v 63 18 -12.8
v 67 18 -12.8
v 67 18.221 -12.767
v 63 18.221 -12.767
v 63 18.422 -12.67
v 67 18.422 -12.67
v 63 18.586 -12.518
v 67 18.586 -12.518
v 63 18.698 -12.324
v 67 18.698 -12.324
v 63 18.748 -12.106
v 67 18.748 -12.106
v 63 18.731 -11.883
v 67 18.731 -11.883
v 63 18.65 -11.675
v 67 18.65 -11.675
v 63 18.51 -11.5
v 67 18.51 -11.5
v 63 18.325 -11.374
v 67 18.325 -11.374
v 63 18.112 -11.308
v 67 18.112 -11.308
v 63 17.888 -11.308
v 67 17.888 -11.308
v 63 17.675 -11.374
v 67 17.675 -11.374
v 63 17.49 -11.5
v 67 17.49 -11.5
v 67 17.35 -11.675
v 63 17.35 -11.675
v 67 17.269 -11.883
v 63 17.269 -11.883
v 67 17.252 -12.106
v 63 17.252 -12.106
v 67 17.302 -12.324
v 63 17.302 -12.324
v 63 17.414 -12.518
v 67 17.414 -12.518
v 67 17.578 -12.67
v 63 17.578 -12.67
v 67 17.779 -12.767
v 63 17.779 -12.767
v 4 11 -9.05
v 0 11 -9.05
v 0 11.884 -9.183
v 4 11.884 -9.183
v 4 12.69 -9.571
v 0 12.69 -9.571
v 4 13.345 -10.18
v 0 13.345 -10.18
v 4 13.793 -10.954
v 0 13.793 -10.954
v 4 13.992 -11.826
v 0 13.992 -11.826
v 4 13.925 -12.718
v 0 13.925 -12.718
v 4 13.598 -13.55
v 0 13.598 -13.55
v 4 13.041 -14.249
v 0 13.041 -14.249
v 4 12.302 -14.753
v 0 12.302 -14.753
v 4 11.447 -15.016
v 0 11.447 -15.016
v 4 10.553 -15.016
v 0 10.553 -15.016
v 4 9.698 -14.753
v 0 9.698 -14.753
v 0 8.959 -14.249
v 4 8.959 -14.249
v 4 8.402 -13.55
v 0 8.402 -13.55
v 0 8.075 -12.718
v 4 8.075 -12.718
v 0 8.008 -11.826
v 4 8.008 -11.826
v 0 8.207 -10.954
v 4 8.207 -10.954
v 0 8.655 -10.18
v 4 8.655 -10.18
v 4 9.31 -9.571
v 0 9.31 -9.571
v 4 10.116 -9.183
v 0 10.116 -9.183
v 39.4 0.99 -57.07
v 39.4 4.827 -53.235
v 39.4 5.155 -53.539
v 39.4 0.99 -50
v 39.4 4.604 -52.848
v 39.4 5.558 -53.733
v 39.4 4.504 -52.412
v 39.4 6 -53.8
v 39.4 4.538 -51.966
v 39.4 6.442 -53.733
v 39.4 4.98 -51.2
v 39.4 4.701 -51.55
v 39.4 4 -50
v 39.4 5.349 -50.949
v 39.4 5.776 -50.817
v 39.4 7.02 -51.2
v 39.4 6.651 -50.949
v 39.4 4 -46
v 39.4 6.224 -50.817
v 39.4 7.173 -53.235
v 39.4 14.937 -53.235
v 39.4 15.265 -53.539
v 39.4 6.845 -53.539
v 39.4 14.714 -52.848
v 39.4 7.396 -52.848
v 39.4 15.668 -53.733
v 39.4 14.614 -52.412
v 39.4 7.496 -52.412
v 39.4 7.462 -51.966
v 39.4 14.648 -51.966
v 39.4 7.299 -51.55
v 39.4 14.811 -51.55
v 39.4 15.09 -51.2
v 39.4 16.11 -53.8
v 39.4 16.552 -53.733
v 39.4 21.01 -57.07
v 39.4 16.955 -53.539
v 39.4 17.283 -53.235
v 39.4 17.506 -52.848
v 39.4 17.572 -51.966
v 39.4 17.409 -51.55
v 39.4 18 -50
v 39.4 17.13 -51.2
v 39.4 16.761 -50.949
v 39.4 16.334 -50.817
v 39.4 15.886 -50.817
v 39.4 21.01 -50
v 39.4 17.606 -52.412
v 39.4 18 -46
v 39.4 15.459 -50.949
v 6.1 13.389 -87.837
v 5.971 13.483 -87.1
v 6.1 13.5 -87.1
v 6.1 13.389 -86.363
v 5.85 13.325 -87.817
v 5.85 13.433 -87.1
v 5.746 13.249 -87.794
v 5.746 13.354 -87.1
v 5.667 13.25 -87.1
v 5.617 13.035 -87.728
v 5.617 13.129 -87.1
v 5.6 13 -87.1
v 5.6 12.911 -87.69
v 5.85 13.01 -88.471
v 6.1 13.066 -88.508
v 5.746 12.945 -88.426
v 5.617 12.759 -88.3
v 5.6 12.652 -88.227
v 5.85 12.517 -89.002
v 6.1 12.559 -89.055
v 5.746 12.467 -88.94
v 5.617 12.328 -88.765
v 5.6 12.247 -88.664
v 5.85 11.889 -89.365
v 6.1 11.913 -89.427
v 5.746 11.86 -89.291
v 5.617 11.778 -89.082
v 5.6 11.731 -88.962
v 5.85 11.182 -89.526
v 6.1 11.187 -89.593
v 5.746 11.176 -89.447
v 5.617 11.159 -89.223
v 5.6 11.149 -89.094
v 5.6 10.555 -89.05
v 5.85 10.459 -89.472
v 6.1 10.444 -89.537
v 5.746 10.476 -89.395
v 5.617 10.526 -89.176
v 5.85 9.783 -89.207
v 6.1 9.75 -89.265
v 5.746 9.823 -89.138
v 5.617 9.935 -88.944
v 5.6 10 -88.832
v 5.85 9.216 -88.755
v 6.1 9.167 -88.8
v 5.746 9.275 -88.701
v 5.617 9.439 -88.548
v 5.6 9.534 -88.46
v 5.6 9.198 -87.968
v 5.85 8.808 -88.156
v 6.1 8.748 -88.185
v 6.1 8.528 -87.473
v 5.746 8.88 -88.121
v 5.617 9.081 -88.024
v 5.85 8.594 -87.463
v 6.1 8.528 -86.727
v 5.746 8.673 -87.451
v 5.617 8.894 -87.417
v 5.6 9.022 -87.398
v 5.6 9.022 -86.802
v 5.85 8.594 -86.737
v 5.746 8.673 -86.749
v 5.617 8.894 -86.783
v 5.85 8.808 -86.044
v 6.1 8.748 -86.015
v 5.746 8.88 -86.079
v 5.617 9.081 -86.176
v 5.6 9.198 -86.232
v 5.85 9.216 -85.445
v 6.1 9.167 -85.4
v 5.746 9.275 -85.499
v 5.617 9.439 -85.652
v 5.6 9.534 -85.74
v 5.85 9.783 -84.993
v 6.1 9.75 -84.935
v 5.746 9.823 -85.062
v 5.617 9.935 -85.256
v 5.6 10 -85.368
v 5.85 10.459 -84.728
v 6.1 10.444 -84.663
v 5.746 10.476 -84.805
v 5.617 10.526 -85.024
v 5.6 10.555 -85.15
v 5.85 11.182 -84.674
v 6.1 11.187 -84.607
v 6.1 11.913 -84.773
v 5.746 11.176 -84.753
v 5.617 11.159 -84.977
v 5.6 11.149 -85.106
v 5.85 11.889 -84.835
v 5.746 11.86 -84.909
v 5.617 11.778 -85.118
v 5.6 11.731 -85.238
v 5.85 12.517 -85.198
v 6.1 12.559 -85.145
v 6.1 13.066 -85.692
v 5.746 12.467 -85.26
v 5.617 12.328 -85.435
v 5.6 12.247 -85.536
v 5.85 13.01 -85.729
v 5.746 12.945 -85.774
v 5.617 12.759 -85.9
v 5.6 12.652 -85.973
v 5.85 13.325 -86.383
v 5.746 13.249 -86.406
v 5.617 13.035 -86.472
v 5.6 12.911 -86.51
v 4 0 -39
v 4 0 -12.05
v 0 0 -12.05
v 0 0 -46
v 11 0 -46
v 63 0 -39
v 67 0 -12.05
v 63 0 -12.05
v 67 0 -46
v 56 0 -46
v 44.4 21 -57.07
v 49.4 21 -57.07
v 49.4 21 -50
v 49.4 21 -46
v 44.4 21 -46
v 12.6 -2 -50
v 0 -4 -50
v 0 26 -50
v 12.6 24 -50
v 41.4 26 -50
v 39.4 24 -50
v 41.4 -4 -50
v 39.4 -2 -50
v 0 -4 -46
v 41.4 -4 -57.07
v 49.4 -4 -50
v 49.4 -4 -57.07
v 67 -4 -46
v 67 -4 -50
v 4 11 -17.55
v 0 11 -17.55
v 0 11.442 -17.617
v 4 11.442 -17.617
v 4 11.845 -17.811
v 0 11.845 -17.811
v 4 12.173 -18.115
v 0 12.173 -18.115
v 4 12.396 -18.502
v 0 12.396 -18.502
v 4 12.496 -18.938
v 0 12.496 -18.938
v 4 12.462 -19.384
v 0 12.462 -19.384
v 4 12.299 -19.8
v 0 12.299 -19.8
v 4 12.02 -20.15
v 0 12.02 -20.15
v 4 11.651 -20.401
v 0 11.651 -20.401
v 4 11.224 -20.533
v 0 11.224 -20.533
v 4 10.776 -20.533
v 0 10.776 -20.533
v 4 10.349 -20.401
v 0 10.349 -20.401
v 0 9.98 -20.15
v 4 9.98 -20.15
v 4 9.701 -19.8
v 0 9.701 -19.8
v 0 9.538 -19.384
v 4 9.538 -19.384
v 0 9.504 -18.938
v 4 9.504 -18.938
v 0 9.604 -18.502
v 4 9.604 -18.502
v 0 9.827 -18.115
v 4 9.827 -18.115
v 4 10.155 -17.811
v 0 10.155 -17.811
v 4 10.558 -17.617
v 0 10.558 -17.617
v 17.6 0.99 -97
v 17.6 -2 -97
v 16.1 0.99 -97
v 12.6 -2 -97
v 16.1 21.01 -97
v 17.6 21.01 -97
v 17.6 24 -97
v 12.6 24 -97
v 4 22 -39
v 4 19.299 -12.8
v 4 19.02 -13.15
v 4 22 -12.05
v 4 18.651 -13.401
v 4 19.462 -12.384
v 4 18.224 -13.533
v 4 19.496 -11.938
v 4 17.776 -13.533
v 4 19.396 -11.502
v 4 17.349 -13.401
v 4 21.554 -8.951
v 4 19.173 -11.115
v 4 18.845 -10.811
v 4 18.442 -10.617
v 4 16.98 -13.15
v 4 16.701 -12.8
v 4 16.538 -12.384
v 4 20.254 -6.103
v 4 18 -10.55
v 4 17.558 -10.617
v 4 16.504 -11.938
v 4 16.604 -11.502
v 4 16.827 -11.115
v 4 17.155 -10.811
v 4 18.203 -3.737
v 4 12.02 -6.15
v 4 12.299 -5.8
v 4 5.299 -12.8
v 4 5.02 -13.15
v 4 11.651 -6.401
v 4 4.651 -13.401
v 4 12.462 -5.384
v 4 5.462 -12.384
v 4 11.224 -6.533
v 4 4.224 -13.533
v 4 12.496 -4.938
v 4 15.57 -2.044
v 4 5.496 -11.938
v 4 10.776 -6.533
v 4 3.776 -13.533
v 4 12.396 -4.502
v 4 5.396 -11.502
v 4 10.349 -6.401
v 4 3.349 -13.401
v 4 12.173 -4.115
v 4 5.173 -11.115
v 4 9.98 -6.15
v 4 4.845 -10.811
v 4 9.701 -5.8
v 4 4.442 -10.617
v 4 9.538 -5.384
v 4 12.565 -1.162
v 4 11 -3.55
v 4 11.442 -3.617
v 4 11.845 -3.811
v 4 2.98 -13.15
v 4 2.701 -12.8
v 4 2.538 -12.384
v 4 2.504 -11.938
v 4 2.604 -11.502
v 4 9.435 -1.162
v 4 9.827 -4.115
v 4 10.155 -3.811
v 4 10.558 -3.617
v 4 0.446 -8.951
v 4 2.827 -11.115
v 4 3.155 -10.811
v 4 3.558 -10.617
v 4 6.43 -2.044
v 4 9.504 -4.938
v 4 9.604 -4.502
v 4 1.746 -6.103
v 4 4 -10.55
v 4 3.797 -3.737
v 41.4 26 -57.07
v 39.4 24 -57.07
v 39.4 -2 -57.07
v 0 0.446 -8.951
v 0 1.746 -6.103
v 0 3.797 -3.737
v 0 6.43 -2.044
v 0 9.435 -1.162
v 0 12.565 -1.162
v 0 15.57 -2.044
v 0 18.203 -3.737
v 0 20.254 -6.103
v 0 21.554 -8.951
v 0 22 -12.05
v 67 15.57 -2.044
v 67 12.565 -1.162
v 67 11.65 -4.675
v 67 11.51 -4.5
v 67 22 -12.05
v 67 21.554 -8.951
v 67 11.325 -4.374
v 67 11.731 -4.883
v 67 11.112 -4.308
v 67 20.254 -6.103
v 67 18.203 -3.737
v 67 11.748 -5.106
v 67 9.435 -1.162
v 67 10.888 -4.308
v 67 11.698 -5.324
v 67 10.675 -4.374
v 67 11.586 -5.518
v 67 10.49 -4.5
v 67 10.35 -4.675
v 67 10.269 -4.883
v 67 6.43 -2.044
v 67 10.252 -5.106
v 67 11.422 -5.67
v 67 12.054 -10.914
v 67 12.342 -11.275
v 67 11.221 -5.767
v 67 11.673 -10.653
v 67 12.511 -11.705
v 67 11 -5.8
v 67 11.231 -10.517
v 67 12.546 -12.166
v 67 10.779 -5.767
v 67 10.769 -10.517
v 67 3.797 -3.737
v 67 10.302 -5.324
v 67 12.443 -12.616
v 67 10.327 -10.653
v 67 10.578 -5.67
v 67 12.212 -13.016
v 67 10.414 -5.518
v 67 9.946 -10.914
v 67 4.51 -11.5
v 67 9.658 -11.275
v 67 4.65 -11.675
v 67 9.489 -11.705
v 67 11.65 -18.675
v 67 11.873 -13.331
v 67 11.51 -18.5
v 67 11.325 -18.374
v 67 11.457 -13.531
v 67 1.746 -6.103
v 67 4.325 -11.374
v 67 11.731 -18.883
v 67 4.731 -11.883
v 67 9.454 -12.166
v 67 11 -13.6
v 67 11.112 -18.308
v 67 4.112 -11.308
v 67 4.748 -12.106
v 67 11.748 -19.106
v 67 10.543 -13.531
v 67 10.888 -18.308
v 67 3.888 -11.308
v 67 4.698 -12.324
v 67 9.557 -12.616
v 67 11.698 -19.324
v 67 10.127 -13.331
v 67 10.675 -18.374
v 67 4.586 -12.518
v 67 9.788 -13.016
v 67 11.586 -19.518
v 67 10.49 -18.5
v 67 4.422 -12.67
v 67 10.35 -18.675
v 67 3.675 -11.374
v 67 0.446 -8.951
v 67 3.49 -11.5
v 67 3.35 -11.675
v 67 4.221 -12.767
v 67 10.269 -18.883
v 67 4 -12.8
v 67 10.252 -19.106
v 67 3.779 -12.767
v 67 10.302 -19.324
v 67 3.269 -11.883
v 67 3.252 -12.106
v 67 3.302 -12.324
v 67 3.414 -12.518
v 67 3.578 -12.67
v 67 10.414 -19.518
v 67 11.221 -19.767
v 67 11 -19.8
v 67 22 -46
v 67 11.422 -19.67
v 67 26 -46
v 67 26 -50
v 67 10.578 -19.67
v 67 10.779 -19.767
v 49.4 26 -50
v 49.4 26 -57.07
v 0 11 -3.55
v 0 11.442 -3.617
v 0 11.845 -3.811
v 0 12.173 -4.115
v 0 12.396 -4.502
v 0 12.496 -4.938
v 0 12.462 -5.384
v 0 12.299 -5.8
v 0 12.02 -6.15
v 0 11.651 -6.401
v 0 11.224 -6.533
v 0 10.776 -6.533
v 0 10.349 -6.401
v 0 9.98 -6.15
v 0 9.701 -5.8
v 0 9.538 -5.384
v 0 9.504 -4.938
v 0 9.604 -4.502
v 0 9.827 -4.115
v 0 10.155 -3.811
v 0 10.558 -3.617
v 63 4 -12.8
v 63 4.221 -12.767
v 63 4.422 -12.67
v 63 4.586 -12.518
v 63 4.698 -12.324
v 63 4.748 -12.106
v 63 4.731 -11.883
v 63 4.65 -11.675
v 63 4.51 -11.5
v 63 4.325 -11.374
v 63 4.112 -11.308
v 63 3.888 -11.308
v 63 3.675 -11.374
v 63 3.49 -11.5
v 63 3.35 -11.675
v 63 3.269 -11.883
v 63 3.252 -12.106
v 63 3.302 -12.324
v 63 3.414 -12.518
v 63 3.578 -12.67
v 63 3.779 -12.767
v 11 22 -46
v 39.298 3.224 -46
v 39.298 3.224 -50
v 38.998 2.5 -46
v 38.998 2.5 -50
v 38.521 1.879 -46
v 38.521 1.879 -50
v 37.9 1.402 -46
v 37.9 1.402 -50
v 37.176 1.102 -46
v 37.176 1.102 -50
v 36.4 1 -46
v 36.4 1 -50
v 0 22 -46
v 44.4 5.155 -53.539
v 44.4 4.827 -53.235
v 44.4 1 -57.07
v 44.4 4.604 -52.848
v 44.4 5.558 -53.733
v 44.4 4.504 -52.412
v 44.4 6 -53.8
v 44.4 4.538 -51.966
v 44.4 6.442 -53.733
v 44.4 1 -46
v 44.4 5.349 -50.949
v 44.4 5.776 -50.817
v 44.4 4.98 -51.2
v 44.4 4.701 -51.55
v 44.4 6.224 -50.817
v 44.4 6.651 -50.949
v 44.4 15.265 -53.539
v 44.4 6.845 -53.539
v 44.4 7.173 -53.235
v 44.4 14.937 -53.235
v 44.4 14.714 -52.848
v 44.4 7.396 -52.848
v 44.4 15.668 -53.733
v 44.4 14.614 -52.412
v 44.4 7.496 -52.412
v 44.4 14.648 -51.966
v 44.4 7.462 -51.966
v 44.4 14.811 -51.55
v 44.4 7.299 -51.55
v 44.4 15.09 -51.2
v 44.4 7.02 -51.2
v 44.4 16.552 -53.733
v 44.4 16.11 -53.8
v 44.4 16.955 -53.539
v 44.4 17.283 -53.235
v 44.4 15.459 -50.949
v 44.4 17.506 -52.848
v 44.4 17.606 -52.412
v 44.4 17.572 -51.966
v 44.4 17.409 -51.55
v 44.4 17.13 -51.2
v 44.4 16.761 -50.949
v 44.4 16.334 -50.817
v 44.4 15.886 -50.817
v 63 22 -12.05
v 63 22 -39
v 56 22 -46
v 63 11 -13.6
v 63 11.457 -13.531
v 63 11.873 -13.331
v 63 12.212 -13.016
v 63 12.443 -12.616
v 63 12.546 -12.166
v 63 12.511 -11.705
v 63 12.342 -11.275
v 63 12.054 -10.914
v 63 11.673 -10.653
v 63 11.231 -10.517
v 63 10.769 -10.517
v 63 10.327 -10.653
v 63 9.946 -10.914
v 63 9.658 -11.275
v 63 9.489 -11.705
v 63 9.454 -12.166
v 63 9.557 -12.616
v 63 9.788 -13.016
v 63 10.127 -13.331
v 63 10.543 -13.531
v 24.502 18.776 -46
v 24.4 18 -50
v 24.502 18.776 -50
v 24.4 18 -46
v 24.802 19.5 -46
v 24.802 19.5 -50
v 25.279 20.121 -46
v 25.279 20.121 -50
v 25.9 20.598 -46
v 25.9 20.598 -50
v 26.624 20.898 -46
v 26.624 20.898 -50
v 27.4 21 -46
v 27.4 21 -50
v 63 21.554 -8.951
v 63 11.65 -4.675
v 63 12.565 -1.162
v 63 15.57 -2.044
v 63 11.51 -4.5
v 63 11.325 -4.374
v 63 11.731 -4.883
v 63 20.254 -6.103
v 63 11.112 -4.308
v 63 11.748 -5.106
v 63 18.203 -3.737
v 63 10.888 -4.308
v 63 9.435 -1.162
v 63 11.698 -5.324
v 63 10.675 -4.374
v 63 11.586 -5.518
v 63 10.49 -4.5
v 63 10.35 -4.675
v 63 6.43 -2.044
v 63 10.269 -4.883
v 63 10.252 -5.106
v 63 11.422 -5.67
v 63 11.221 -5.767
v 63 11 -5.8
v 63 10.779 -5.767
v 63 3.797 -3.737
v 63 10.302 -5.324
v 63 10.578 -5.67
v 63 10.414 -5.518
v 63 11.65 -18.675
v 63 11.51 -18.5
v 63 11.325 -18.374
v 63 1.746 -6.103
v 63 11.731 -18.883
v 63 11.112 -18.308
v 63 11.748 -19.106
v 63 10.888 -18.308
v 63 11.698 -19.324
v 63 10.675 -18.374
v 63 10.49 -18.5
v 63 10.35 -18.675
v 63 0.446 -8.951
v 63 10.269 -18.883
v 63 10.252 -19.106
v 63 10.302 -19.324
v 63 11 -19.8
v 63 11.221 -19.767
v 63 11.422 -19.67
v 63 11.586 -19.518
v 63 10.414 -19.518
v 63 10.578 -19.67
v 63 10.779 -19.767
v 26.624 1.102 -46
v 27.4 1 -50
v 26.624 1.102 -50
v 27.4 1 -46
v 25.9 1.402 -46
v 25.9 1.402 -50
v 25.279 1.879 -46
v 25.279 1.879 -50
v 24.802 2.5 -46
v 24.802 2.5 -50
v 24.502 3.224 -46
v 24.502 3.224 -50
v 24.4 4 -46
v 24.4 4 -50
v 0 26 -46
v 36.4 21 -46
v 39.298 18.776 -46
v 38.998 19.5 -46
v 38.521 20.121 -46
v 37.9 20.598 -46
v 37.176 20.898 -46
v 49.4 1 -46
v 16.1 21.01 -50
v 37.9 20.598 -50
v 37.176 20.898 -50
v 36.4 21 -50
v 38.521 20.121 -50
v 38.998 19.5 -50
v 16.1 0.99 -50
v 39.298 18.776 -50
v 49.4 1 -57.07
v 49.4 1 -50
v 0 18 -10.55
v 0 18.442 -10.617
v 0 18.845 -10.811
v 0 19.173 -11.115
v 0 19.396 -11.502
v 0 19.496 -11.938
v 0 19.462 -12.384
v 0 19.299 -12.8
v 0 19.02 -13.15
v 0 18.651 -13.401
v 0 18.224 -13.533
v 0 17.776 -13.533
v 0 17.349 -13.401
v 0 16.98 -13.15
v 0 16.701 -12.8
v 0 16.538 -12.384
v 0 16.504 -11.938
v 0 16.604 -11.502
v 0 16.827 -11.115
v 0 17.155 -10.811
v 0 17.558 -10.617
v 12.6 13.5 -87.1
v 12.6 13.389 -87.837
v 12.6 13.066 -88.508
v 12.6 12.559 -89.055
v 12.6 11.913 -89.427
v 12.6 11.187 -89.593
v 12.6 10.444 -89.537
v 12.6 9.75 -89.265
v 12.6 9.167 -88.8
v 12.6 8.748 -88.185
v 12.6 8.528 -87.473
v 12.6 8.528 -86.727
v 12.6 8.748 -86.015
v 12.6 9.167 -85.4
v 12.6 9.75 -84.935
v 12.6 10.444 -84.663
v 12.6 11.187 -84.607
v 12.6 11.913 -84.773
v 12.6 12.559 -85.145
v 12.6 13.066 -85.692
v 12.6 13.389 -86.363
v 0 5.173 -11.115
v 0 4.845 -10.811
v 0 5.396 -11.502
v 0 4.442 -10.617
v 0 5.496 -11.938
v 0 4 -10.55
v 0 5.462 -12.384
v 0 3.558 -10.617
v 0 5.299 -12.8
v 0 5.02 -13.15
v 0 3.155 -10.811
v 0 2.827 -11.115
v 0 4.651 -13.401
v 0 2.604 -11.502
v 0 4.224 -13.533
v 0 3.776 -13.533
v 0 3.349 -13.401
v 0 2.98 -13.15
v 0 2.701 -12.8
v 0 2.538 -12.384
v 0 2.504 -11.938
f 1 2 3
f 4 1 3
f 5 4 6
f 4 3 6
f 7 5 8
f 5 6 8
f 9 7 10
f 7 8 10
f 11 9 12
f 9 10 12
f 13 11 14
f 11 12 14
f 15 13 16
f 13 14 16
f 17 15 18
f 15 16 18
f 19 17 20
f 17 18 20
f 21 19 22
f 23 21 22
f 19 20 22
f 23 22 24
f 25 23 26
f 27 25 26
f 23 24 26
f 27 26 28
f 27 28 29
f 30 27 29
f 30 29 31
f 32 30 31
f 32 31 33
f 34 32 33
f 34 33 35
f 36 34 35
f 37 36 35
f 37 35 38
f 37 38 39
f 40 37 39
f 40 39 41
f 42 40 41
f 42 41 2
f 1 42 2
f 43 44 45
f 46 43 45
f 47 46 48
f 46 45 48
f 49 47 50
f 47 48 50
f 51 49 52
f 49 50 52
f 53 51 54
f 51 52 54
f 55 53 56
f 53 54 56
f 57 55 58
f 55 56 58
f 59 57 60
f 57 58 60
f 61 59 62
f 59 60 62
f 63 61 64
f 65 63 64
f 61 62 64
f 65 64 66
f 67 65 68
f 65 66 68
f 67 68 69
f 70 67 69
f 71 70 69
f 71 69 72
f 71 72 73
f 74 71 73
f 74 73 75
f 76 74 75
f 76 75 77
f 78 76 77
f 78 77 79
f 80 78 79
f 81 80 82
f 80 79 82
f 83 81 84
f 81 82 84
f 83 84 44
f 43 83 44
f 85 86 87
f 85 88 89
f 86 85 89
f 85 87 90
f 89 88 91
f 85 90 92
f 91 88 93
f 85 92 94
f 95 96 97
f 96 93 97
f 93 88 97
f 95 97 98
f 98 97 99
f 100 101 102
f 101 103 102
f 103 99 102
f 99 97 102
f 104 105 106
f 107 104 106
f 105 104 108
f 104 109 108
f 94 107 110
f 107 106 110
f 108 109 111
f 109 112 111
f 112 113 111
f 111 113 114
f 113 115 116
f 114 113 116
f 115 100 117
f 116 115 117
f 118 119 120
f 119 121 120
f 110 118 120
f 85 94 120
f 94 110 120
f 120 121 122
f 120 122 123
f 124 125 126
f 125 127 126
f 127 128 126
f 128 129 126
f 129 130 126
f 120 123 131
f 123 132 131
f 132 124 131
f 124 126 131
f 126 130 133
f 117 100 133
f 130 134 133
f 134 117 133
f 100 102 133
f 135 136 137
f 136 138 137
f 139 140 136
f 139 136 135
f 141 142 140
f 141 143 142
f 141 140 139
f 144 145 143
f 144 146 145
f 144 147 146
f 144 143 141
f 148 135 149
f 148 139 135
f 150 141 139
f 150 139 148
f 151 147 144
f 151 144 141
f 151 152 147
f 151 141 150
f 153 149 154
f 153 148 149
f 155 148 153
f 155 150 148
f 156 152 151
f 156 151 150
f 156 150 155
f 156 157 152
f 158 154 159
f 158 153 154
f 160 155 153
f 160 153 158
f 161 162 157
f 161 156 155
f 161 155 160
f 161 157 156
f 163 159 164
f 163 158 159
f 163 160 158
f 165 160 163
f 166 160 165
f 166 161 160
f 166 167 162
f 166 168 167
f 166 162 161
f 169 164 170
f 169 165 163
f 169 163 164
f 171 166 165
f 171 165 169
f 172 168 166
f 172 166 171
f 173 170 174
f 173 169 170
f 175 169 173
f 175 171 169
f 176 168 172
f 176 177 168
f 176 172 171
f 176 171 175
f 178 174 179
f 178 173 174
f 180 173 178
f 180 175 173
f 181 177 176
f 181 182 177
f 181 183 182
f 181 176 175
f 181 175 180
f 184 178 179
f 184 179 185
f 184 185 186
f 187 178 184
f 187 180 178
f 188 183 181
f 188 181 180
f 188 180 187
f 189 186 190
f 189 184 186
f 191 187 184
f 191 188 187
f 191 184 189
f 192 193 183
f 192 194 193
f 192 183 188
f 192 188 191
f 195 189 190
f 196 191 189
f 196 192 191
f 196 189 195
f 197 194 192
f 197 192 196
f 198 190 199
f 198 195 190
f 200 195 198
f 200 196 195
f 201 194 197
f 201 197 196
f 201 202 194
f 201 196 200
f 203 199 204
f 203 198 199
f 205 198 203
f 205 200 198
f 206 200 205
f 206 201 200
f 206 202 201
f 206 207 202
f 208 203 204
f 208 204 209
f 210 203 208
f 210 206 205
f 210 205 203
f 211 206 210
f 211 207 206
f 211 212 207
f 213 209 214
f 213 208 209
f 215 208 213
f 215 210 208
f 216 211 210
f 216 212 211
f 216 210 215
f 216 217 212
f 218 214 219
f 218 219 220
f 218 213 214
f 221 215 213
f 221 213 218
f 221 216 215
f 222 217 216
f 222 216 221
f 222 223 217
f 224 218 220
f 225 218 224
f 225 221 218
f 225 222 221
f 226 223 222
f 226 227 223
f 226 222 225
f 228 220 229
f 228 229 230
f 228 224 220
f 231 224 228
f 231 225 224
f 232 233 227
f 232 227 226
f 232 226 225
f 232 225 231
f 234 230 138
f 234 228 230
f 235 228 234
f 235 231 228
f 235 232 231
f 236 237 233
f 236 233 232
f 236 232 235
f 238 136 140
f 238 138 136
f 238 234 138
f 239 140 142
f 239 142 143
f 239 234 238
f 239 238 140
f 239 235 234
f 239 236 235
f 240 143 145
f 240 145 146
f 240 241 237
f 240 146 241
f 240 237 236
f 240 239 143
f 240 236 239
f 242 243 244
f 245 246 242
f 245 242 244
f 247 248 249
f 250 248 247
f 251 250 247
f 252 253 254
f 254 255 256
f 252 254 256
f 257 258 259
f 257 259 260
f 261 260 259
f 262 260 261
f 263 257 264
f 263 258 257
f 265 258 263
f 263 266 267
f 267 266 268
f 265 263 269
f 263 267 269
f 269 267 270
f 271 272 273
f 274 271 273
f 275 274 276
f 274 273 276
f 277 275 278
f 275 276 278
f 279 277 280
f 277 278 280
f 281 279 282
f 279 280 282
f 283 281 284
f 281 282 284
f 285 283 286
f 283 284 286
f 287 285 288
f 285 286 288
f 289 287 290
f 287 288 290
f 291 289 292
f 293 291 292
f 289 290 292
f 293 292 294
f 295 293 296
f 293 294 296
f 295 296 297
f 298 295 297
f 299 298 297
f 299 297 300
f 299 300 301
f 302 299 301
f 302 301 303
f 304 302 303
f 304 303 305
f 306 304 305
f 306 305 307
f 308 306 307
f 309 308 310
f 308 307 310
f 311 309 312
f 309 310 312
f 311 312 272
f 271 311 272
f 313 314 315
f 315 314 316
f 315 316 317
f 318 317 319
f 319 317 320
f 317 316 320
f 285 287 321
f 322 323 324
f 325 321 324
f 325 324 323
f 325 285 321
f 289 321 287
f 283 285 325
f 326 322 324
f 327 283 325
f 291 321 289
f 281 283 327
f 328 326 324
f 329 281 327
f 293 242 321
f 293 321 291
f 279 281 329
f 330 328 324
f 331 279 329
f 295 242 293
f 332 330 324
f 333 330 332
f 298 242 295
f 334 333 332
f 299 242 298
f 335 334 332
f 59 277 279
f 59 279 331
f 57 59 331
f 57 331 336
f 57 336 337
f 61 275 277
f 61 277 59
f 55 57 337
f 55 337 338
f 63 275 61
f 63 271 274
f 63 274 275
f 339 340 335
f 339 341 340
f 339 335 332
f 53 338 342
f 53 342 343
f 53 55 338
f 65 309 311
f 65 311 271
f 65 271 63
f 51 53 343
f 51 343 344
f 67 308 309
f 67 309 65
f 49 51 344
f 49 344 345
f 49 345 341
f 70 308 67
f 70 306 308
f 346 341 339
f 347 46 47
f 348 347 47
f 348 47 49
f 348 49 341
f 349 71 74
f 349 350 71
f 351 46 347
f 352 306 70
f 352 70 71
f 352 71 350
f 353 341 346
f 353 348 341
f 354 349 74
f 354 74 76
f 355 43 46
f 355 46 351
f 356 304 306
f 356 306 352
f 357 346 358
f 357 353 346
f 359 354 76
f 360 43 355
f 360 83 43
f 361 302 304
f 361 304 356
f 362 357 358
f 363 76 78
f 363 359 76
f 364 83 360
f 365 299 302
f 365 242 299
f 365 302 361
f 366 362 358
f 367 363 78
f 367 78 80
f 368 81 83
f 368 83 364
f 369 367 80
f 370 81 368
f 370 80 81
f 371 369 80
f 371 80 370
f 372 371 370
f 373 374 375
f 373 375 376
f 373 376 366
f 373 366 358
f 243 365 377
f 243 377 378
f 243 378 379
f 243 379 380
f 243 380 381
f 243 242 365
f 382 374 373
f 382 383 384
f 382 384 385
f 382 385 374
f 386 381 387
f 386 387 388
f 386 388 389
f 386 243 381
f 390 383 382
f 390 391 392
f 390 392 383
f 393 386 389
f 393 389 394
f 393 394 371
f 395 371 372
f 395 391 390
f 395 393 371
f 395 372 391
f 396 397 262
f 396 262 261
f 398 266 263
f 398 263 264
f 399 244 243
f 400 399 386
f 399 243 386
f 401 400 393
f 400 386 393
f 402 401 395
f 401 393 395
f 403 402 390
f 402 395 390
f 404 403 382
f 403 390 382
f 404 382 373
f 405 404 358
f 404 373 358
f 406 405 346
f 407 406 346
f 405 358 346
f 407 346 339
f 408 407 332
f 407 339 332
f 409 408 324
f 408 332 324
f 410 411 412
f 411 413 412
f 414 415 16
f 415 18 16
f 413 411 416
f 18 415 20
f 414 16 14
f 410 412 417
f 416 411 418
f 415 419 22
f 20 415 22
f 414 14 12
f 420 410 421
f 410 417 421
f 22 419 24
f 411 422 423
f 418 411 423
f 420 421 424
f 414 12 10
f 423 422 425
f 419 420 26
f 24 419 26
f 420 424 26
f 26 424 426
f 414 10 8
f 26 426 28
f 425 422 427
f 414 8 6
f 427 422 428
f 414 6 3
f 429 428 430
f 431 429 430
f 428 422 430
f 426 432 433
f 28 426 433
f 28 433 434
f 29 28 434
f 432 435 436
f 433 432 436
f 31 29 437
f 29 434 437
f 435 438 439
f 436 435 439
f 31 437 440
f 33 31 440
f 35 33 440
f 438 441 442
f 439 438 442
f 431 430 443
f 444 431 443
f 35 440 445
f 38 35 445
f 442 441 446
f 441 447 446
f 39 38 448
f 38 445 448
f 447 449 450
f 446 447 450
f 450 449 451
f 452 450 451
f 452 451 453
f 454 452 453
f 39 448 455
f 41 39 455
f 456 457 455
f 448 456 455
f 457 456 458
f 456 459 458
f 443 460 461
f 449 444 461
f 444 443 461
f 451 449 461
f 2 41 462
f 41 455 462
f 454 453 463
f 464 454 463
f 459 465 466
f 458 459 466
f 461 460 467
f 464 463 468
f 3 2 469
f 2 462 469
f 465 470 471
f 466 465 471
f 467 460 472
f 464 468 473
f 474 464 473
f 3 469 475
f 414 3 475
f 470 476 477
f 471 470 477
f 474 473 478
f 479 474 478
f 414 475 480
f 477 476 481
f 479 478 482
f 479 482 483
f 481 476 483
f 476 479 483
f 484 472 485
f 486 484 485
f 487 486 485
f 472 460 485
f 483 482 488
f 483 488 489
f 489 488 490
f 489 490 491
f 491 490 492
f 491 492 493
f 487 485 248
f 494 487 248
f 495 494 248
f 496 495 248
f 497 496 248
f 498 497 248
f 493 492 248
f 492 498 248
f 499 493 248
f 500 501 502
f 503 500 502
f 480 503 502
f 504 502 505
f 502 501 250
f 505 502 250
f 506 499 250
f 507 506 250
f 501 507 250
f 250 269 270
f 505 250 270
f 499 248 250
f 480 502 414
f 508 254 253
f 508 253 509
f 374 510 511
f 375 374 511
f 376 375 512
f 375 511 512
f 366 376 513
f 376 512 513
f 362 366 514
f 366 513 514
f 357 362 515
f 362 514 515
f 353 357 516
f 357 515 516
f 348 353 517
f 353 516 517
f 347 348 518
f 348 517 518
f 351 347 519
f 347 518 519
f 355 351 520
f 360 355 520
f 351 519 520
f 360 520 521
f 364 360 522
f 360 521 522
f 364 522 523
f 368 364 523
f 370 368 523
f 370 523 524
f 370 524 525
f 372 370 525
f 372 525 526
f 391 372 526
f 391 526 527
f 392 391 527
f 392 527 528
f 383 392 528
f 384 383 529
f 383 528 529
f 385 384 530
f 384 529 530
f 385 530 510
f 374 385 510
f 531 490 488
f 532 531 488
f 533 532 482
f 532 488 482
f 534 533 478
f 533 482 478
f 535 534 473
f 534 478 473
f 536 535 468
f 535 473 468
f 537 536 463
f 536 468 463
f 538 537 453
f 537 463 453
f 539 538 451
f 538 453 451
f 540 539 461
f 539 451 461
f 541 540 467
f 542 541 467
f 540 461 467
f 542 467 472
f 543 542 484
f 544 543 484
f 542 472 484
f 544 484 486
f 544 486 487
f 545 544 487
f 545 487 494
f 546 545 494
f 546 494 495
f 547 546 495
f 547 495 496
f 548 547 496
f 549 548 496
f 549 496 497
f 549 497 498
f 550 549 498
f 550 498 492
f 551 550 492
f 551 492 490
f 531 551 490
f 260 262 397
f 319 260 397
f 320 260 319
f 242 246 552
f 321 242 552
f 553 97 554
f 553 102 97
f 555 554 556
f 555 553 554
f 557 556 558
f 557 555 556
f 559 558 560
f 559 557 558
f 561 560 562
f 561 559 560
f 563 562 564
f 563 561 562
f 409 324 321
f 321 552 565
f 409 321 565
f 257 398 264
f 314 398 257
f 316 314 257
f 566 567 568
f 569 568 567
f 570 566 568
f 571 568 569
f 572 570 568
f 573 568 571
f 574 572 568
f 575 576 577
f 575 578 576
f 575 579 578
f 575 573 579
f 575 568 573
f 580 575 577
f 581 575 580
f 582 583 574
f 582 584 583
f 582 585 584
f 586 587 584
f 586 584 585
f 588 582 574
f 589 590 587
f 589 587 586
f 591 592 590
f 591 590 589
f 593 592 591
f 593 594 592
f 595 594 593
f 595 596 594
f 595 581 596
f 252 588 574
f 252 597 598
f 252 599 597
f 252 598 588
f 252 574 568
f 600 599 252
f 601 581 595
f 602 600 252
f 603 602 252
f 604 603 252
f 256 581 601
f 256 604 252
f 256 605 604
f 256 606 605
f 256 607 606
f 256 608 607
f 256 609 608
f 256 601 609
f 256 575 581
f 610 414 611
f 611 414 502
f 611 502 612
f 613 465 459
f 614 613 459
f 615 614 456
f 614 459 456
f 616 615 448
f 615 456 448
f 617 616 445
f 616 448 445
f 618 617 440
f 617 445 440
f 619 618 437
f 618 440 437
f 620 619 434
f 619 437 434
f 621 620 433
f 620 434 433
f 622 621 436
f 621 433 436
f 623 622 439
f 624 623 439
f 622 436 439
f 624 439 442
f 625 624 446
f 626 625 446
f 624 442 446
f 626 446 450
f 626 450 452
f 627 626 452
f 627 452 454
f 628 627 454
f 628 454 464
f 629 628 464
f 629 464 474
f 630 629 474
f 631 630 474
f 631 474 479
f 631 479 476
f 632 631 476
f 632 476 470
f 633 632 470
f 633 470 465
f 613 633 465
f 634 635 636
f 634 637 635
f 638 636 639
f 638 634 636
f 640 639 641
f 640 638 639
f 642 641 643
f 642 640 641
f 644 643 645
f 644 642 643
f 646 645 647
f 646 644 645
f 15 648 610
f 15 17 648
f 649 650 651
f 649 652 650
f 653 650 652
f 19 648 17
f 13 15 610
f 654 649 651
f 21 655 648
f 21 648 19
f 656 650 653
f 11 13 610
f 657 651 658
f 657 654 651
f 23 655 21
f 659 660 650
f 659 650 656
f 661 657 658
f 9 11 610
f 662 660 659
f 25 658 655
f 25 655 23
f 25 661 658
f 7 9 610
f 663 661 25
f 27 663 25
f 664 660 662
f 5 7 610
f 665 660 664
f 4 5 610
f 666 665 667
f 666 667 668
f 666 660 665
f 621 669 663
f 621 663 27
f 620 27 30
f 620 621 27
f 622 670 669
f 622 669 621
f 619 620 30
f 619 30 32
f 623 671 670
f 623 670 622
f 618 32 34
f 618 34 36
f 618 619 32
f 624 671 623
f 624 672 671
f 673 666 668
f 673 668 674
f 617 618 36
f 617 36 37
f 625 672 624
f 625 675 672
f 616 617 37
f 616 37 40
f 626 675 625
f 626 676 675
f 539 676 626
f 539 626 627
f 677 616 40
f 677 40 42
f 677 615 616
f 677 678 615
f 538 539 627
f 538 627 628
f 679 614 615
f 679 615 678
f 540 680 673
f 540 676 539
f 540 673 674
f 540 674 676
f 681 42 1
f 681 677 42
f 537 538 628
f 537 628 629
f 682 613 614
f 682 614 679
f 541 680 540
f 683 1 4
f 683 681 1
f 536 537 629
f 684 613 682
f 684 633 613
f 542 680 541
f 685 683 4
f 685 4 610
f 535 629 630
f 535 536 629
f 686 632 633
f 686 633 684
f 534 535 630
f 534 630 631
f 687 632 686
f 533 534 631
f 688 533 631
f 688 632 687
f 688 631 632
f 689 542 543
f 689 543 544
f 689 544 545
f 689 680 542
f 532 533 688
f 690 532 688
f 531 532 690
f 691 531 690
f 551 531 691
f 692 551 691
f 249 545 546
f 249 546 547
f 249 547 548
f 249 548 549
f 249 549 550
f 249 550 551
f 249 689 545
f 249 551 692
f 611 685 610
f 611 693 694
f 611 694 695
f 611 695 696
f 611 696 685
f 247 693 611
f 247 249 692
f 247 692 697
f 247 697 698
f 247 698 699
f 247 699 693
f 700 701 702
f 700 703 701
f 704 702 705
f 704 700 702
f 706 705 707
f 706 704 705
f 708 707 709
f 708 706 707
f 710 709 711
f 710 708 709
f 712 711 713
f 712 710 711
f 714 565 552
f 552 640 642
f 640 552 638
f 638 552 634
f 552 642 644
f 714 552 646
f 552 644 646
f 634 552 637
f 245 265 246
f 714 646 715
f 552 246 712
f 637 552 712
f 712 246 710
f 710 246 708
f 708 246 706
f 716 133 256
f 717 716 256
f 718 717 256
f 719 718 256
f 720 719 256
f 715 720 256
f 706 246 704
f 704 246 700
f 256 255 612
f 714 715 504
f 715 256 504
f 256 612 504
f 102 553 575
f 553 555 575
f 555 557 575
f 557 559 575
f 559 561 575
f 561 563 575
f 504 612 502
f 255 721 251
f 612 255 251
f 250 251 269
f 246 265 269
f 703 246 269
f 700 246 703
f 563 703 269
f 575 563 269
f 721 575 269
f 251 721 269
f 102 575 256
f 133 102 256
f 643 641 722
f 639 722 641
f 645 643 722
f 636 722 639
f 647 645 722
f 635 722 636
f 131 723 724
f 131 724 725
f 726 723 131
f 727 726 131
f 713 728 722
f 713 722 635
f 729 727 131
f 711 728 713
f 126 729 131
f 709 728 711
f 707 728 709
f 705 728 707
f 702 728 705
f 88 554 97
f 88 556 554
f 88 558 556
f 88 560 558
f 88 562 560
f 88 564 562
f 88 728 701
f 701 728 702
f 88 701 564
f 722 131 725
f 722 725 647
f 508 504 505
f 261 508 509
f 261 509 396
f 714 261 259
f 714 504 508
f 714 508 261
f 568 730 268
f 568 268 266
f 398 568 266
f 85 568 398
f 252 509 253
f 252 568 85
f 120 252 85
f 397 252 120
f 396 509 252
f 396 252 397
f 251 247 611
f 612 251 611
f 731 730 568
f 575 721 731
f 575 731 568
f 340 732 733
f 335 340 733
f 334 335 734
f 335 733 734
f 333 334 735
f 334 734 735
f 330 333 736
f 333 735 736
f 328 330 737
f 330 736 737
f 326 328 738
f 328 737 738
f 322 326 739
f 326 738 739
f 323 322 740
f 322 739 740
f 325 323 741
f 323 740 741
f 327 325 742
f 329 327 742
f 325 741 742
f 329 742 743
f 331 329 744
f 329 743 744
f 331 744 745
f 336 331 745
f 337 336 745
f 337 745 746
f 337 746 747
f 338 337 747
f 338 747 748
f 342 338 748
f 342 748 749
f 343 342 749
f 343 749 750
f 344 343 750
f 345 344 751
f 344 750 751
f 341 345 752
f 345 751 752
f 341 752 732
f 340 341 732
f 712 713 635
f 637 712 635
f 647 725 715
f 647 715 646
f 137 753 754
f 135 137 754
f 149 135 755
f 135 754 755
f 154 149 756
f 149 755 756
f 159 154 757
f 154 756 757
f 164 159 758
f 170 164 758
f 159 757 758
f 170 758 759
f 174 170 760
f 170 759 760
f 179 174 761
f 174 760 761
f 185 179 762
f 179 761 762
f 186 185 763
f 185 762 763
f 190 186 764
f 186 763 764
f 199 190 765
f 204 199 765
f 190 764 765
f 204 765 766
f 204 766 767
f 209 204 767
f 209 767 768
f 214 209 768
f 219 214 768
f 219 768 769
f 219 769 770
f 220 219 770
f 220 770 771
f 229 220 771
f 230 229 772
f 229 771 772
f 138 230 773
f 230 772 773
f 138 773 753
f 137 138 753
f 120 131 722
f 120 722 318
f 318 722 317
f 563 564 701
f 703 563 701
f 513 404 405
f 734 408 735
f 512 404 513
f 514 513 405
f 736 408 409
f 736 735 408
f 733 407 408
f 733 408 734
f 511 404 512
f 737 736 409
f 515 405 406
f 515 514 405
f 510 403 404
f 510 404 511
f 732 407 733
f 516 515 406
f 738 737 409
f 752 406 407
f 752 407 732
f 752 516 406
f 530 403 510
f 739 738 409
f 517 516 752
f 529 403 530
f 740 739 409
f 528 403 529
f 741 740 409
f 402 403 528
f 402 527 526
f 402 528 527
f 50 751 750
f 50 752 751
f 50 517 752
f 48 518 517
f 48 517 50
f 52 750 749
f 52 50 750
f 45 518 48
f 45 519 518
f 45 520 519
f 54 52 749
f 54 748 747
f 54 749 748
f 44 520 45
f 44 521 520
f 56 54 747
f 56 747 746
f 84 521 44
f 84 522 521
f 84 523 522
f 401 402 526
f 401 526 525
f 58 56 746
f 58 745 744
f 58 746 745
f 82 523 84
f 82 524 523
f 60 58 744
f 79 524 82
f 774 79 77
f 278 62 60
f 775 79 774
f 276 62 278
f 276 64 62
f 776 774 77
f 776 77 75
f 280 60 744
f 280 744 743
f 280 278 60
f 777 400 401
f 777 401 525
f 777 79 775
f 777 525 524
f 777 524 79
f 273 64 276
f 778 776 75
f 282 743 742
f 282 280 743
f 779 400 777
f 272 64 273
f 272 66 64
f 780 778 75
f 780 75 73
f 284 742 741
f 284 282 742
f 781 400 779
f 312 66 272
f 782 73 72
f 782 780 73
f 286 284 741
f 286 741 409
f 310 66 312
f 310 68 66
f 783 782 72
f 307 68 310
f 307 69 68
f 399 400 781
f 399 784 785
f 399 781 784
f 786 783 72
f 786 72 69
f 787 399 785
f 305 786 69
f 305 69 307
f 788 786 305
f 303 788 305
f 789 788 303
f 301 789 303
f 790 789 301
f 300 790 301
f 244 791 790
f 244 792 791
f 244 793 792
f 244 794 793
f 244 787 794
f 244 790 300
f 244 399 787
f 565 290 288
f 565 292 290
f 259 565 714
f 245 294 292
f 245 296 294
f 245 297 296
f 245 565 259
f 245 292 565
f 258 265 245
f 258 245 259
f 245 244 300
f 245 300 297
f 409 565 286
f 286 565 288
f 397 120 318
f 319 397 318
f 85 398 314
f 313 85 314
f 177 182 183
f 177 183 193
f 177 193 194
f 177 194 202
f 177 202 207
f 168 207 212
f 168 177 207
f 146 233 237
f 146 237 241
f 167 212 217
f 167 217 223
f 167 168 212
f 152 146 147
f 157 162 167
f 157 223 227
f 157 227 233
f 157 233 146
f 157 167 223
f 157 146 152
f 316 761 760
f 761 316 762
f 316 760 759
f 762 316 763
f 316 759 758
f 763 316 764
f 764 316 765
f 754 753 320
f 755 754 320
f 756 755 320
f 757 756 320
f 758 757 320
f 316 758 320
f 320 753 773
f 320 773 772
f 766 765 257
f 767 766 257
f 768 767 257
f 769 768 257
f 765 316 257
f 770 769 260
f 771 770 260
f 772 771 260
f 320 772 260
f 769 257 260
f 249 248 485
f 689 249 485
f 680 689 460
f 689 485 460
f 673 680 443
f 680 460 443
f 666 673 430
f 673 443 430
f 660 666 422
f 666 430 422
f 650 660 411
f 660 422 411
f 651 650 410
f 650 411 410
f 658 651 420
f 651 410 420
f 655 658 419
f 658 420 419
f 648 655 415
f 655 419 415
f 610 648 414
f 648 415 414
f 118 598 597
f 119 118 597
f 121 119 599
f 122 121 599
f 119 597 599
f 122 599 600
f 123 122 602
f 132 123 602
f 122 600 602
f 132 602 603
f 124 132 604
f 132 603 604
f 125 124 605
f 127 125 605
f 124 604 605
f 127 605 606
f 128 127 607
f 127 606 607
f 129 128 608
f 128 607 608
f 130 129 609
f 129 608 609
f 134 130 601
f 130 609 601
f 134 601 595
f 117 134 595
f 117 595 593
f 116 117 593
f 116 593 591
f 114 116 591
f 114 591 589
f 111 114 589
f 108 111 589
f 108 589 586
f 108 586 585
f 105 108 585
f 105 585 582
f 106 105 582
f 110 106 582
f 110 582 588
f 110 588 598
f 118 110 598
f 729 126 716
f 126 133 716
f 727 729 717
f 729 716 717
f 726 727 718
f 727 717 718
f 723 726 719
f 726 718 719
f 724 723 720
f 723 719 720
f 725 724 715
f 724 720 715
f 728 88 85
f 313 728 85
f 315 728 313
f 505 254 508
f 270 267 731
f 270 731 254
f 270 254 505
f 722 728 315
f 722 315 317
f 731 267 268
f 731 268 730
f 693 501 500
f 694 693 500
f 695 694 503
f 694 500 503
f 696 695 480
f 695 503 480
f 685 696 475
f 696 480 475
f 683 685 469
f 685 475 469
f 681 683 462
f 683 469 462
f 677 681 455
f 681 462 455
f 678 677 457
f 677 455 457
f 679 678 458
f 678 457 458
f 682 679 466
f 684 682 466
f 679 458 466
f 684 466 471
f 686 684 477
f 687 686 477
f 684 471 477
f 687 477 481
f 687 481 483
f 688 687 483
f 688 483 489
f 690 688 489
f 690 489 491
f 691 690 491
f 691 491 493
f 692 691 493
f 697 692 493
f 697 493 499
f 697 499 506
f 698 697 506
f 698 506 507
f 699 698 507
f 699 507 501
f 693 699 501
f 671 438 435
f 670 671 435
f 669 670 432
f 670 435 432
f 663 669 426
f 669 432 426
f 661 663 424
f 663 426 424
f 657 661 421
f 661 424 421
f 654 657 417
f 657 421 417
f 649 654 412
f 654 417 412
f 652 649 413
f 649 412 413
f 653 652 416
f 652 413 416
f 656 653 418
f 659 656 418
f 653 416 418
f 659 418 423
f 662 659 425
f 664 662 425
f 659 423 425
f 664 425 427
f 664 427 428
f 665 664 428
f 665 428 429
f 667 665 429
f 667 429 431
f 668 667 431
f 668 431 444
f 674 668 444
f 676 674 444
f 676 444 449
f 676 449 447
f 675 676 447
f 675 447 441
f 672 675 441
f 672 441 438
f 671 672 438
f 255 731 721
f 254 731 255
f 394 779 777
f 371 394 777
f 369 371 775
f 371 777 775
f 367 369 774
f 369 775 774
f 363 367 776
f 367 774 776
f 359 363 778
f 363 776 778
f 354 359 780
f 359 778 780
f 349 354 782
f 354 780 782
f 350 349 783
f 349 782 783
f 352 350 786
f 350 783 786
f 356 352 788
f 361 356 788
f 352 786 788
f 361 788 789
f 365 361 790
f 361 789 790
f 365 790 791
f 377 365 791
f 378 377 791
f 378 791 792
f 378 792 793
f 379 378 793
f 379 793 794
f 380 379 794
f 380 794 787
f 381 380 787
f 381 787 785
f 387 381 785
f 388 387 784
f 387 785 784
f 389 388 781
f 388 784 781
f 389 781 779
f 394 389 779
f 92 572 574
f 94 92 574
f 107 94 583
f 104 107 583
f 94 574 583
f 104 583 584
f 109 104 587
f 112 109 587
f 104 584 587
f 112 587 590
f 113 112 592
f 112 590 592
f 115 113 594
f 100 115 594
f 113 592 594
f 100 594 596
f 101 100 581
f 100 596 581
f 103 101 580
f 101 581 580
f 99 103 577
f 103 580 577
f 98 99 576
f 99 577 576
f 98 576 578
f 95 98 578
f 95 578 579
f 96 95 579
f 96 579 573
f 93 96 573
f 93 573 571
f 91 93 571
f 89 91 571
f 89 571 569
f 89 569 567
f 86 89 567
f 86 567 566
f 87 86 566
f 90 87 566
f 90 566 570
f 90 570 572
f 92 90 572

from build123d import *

# Parameters (mm, degrees)
BOSS_EXTRUDE1_DEPTH      = 22
SKETCH3_R                = 1.55
CUT_EXTRUDE1_DEPTH       = 30
CUT_EXTRUDE5_DEPTH       = 9
SKETCH11_R               = 0.75
CUT_EXTRUDE10_DEPTH      = 13
CUT_EXTRUDE11_START      = -10
CUT_EXTRUDE11_DEPTH      = 10
SKETCH13_R               = 3
SKETCH13_R_2             = 1.5
CUT_EXTRUDE12_DEPTH      = 4
FILLET1_SIZE             = 7
SKETCH14_W               = 54
SKETCH14_H               = 9.3
SKETCH14_W_2             = 7.05
SKETCH14_H_2             = 4
BOSS_EXTRUDE4_DEPTH      = 4
SKETCH17_W               = 7.05
SKETCH17_H               = 4
BOSS_EXTRUDE5_DEPTH      = 23.05
BOSS_EXTRUDE6_DEPTH      = 27.3
BOSS_EXTRUDE6_DEPTH_BACK = 4
SKETCH18_W               = 54
SKETCH18_H               = 2.95
SKETCH19_W               = 54
SKETCH19_H               = 2.8
BOSS_EXTRUDE7_DEPTH      = 21
FILLET2_SIZE             = 6.5
FILLET3_SIZE             = 0.5
SKETCH20_R               = 3.970030919
BOSS_EXTRUDE8_DEPTH      = 6
FILLET4_R                = 1
CUT_EXTRUDE13_START      = -37.3
CUT_EXTRUDE13_DEPTH      = 37.3
SKETCH22_W               = 56.118071471
SKETCH22_H               = 11.813110758
CUT_EXTRUDE14_DEPTH      = 56
BOSS_EXTRUDE9_DEPTH      = 4
BOSS_EXTRUDE9_DEPTH_BACK = 26
SKETCH23_W               = 67
SKETCH23_H               = 4
SKETCH25_W               = 5
SKETCH25_H               = 30
BOSS_EXTRUDE10_DEPTH     = 7.07
SKETCH26_W               = 5
SKETCH26_H               = 5
BOSS_EXTRUDE11_DEPTH     = 7.07
SKETCH27_R               = 1.5
CUT_EXTRUDE15_DEPTH      = 7.07
SKETCH28_W               = 5
SKETCH28_H               = 20
SKETCH28_W_2             = 15
CUT_EXTRUDE16_DEPTH      = 7.07
SKETCH29_W               = 3.5
SKETCH29_H               = 30
BOSS_EXTRUDE12_DEPTH     = 47
SKETCH31_W               = 3.5
SKETCH31_H               = 2
CUT_EXTRUDE18_DEPTH      = 47
FILLET8_R                = 3
SKETCH34_W               = 47
SKETCH34_H               = 2.99
BOSS_EXTRUDE14_DEPTH     = 23.3
CUT_EXTRUDE19_DEPTH      = 38
CUT_EXTRUDE20_DEPTH      = 7.07
SKETCH37_R               = 2.5
BOSS_EXTRUDE15_DEPTH     = 7
FILLET10_R               = 0.5


# Read off the part's stored shape, not the designer's step: Cut-Extrude13
with BuildPart() as part:
    # Sketch1 → Boss-Extrude1 (new body)
    with BuildSketch(Plane(origin=(0, 0, 0), x_dir=(1, 0, 0), z_dir=(0, 1, 0))):
        Polygon((0, 0), (0, 50), (67, 50), (67, 0), (63, 0), (63, 46), (4, 46), (4, 0), align=None)
    extrude(amount=BOSS_EXTRUDE1_DEPTH)

    # Sketch3 → Cut-Extrude1 (cut)
    with BuildSketch(Plane(origin=(67, 0, 0), x_dir=(0, 0, -1), z_dir=(1, 0, 0))):
        with Locations((12.05, 11)):
            Circle(SKETCH3_R)
    extrude(amount=-CUT_EXTRUDE1_DEPTH, mode=Mode.SUBTRACT)

    # Sketch5 → Cut-Extrude5 (cut)
    with BuildSketch(Plane(origin=(67, 0, 0), x_dir=(0, 0, -1), z_dir=(1, 0, 0))):
        with BuildLine():
            Line((12.05, 22), (0, 22))
            Line((0, 22), (0, 0))
            Line((0, 0), (12.05, 0))
            ThreePointArc((12.05, 0), (1.05, 11), (12.05, 22))
        make_face()
    extrude(amount=-CUT_EXTRUDE5_DEPTH, mode=Mode.SUBTRACT)

    # Sketch11 → Cut-Extrude10 (cut)
    with BuildSketch(Plane(origin=(67, 0, 0), x_dir=(0, 0, -1), z_dir=(1, 0, 0))):
        with Locations((19.05, 11)):
            Circle(SKETCH11_R)
        with Locations((12.05, 18)):
            Circle(SKETCH11_R)
        with Locations((12.05, 4)):
            Circle(SKETCH11_R)
        with Locations((5.05, 11)):
            Circle(SKETCH11_R)
    extrude(amount=-CUT_EXTRUDE10_DEPTH, mode=Mode.SUBTRACT)

    # Sketch12 → Cut-Extrude11 (cut)
    with BuildSketch(Plane.ZY.offset(CUT_EXTRUDE11_START)):
        with BuildLine():
            Line((-12.05, 22), (0, 22))
            Line((0, 22), (0, 0))
            Line((0, 0), (-12.05, 0))
            ThreePointArc((-12.05, 0), (-1.05, 11), (-12.05, 22))
        make_face()
    extrude(amount=CUT_EXTRUDE11_DEPTH, mode=Mode.SUBTRACT)

    # Sketch13 → Cut-Extrude12 (cut)
    with BuildSketch(Plane.ZY):
        with Locations((-12.05, 11)):
            Circle(SKETCH13_R)
        with Locations((-19.05, 11)):
            Circle(SKETCH13_R_2)
        with Locations((-12.05, 4)):
            Circle(SKETCH13_R_2)
        with Locations((-5.05, 11)):
            Circle(SKETCH13_R_2)
        with Locations((-12.05, 18)):
            Circle(SKETCH13_R_2)
    extrude(amount=-CUT_EXTRUDE12_DEPTH, mode=Mode.SUBTRACT)

    # Fillet1
    fillet1_edges = [part.edges().sort_by_distance(p)[0] for p in [
        (63, 11, -46),
        (4, 11, -46),
    ]]
    chamfer(fillet1_edges, length=FILLET1_SIZE)

    # Sketch14 → Boss-Extrude4 (add)
    with BuildSketch(Plane(origin=(0, 0, -50), x_dir=(-1, 0, 0), z_dir=(0, 0, -1))):
        with Locations((-33.5, -4.65)):
            Rectangle(SKETCH14_W, SKETCH14_H)
        with Locations((-56.975, 20)):
            Rectangle(SKETCH14_W_2, SKETCH14_H_2)
        with Locations((-10.025, 20)):
            Rectangle(SKETCH14_W_2, SKETCH14_H_2)
    extrude(amount=-BOSS_EXTRUDE4_DEPTH)

    # Sketch17 → Boss-Extrude5 (add)
    with BuildSketch(Plane(origin=(0, 0, -50), x_dir=(-1, 0, 0), z_dir=(0, 0, -1))):
        with Locations((-56.975, 20)):
            Rectangle(SKETCH17_W, SKETCH17_H)
        with Locations((-10.025, 20)):
            Rectangle(SKETCH17_W, SKETCH17_H)
    extrude(amount=BOSS_EXTRUDE5_DEPTH)

    # Sketch18 → Boss-Extrude6 (add, two sides: drawn at the far end of the back side and taken through both)
    with BuildSketch(Plane.XZ.offset(-18).offset(-BOSS_EXTRUDE6_DEPTH_BACK)):
        with Locations((33.5, -71.575)):
            Rectangle(SKETCH18_W, SKETCH18_H)
    extrude(amount=BOSS_EXTRUDE6_DEPTH + BOSS_EXTRUDE6_DEPTH_BACK)

    # Sketch19 → Boss-Extrude7 (add)
    with BuildSketch(Plane(origin=(0, 0, -50), x_dir=(-1, 0, 0), z_dir=(0, 0, -1))):
        with Locations((-33.5, -7.9)):
            Rectangle(SKETCH19_W, SKETCH19_H)
    extrude(amount=BOSS_EXTRUDE7_DEPTH)

    # Fillet2
    fillet2_edges = [part.edges().sort_by_distance(p)[0] for p in [
        (60.5, 20, -50),
        (6.5, 20, -50),
    ]]
    chamfer(fillet2_edges, length=FILLET2_SIZE - 0.0001)  # a hair under: the kernel refuses the full size

    # Fillet3
    fillet3_edges = [part.edges().sort_by_distance(p)[0] for p in [
        (60.5, 6.35, -73.05),
        (6.5, 6.35, -73.05),
    ]]
    chamfer(fillet3_edges, length=FILLET3_SIZE)

    # Sketch20 → Boss-Extrude8 (add)
    with BuildSketch(Plane.XZ.offset(9.3)):
        with Locations(Location((23.4, -59.65, 0), (0, 0, 270))):
            Circle(SKETCH20_R)
    extrude(amount=BOSS_EXTRUDE8_DEPTH)

    # Fillet4
    fillet4_edges = [part.edges().sort_by_distance(p)[0] for p in [
        (23.4, -15.3, -55.679969081),
    ]]
    fillet(fillet4_edges, radius=FILLET4_R)

    # Cut-Extrude13 outline → Cut-Extrude13 (cut)
    with BuildSketch(Plane(origin=(0, 22, 0), x_dir=(1, 0, 0), z_dir=(0, 1, 0)).offset(CUT_EXTRUDE13_START)):
        Polygon((67, 50), (60.5, 56.5), (60.5, 72.55), (60, 73.05), (7, 73.05), (6.5, 72.55), (6.5, 56.5), (0, 50), align=None)
    extrude(amount=CUT_EXTRUDE13_DEPTH, mode=Mode.SUBTRACT)

    # Sketch22 → Cut-Extrude14 (cut)
    with BuildSketch(Plane(origin=(0, 0, -50), x_dir=(-1, 0, 0), z_dir=(0, 0, -1))):
        with Locations((-32.440964265, -5.906555379)):
            Rectangle(SKETCH22_W, SKETCH22_H)
    extrude(amount=-CUT_EXTRUDE14_DEPTH, mode=Mode.SUBTRACT)

    # Sketch23 → Boss-Extrude9 (add, two sides: drawn at the far end of the back side and taken through both)
    with BuildSketch(Plane(origin=(0, 22, 0), x_dir=(1, 0, 0), z_dir=(0, 1, 0)).offset(-BOSS_EXTRUDE9_DEPTH_BACK)):
        with Locations((33.5, 48)):
            Rectangle(SKETCH23_W, SKETCH23_H)
    extrude(amount=BOSS_EXTRUDE9_DEPTH + BOSS_EXTRUDE9_DEPTH_BACK)

    # Sketch25 → Boss-Extrude10 (add)
    with BuildSketch(Plane(origin=(0, 0, -50), x_dir=(-1, 0, 0), z_dir=(0, 0, -1))):
        with Locations((-41.9, 11)):
            Rectangle(SKETCH25_W, SKETCH25_H)
    extrude(amount=BOSS_EXTRUDE10_DEPTH)

    # Sketch26 → Boss-Extrude11 (add)
    with BuildSketch(Plane(origin=(0, 0, -50), x_dir=(-1, 0, 0), z_dir=(0, 0, -1))):
        with Locations((-46.9, 23.5)):
            Rectangle(SKETCH26_W, SKETCH26_H)
        with Locations((-46.9, -1.5)):
            Rectangle(SKETCH26_W, SKETCH26_H)
    extrude(amount=BOSS_EXTRUDE11_DEPTH)

    # Sketch27 → Cut-Extrude15 (cut)
    with BuildSketch(Plane(origin=(44.4, 0, 0), x_dir=(0, 0, -1), z_dir=(1, 0, 0))):
        with Locations((52.3, 6)):
            Circle(SKETCH27_R)
        with Locations((52.3, 16.11)):
            Circle(SKETCH27_R)
    extrude(amount=-CUT_EXTRUDE15_DEPTH, mode=Mode.SUBTRACT)

    # Sketch28 → Cut-Extrude16 (cut)
    with BuildSketch(Plane(origin=(0, 0, -50), x_dir=(-1, 0, 0), z_dir=(0, 0, -1))):
        with Locations((-46.9, 11)):
            Rectangle(SKETCH28_W, SKETCH28_H)
        with Locations((-31.9, 11)):
            Rectangle(SKETCH28_W_2, SKETCH28_H)
    extrude(amount=-CUT_EXTRUDE16_DEPTH, mode=Mode.SUBTRACT)

    # Sketch29 → Boss-Extrude12 (add)
    with BuildSketch(Plane(origin=(0, 0, -50), x_dir=(-1, 0, 0), z_dir=(0, 0, -1))):
        with Locations((-14.35, 11)):
            Rectangle(SKETCH29_W, SKETCH29_H)
    extrude(amount=BOSS_EXTRUDE12_DEPTH)

    # Sketch31 → Cut-Extrude18 (cut)
    with BuildSketch(Plane(origin=(0, 0, -97), x_dir=(-1, 0, 0), z_dir=(0, 0, -1))):
        with Locations((-14.35, 25)):
            Rectangle(SKETCH31_W, SKETCH31_H)
        with Locations((-14.35, -3)):
            Rectangle(SKETCH31_W, SKETCH31_H)
    extrude(amount=-CUT_EXTRUDE18_DEPTH, mode=Mode.SUBTRACT)

    # Fillet8
    fillet8_edges = [part.edges().sort_by_distance(p)[0] for p in [
        (39.4, 1, -48),
        (39.4, 21, -48),
        (24.4, 21, -48),
        (24.4, 1, -48),
    ]]
    fillet(fillet8_edges, radius=FILLET8_R)

    # Sketch34 → Boss-Extrude14 (add)
    with BuildSketch(Plane(origin=(16.1, 0, 0), x_dir=(0, 0, -1), z_dir=(1, 0, 0))):
        with Locations((73.5, 22.505)):
            Rectangle(SKETCH34_W, SKETCH34_H)
        with Locations((73.5, -0.505)):
            Rectangle(SKETCH34_W, SKETCH34_H)
    extrude(amount=BOSS_EXTRUDE14_DEPTH)

    # Sketch35 → Cut-Extrude19 (cut)
    with BuildSketch(Plane.XZ.offset(2)):
        Polygon((39.4, -57.07), (17.6, -97), (39.4, -97), align=None)
    extrude(amount=-CUT_EXTRUDE19_DEPTH, mode=Mode.SUBTRACT)

    # Sketch36 → Cut-Extrude20 (cut)
    with BuildSketch(Plane(origin=(0, 0, -57.07), x_dir=(-1, 0, 0), z_dir=(0, 0, -1))):
        Polygon((-39.4, 24), (-41.4, 26), (-39.4, 26), align=None)
        Polygon((-39.4, -2), (-39.4, -4), (-41.4, -4), align=None)
    extrude(amount=-CUT_EXTRUDE20_DEPTH, mode=Mode.SUBTRACT)

    # Sketch37 → Boss-Extrude15 (add)
    with BuildSketch(Plane.ZY.offset(-12.6)):
        with Locations(Location((-87.1, 11, 0), (0, 0, 90))):
            Circle(SKETCH37_R)
    extrude(amount=BOSS_EXTRUDE15_DEPTH)

    # Fillet10
    fillet10_edges = [part.edges().sort_by_distance(p)[0] for p in [
        (5.6, 8.5, -87.1),
    ]]
    fillet(fillet10_edges, radius=FILLET10_R)


solid = part.part
